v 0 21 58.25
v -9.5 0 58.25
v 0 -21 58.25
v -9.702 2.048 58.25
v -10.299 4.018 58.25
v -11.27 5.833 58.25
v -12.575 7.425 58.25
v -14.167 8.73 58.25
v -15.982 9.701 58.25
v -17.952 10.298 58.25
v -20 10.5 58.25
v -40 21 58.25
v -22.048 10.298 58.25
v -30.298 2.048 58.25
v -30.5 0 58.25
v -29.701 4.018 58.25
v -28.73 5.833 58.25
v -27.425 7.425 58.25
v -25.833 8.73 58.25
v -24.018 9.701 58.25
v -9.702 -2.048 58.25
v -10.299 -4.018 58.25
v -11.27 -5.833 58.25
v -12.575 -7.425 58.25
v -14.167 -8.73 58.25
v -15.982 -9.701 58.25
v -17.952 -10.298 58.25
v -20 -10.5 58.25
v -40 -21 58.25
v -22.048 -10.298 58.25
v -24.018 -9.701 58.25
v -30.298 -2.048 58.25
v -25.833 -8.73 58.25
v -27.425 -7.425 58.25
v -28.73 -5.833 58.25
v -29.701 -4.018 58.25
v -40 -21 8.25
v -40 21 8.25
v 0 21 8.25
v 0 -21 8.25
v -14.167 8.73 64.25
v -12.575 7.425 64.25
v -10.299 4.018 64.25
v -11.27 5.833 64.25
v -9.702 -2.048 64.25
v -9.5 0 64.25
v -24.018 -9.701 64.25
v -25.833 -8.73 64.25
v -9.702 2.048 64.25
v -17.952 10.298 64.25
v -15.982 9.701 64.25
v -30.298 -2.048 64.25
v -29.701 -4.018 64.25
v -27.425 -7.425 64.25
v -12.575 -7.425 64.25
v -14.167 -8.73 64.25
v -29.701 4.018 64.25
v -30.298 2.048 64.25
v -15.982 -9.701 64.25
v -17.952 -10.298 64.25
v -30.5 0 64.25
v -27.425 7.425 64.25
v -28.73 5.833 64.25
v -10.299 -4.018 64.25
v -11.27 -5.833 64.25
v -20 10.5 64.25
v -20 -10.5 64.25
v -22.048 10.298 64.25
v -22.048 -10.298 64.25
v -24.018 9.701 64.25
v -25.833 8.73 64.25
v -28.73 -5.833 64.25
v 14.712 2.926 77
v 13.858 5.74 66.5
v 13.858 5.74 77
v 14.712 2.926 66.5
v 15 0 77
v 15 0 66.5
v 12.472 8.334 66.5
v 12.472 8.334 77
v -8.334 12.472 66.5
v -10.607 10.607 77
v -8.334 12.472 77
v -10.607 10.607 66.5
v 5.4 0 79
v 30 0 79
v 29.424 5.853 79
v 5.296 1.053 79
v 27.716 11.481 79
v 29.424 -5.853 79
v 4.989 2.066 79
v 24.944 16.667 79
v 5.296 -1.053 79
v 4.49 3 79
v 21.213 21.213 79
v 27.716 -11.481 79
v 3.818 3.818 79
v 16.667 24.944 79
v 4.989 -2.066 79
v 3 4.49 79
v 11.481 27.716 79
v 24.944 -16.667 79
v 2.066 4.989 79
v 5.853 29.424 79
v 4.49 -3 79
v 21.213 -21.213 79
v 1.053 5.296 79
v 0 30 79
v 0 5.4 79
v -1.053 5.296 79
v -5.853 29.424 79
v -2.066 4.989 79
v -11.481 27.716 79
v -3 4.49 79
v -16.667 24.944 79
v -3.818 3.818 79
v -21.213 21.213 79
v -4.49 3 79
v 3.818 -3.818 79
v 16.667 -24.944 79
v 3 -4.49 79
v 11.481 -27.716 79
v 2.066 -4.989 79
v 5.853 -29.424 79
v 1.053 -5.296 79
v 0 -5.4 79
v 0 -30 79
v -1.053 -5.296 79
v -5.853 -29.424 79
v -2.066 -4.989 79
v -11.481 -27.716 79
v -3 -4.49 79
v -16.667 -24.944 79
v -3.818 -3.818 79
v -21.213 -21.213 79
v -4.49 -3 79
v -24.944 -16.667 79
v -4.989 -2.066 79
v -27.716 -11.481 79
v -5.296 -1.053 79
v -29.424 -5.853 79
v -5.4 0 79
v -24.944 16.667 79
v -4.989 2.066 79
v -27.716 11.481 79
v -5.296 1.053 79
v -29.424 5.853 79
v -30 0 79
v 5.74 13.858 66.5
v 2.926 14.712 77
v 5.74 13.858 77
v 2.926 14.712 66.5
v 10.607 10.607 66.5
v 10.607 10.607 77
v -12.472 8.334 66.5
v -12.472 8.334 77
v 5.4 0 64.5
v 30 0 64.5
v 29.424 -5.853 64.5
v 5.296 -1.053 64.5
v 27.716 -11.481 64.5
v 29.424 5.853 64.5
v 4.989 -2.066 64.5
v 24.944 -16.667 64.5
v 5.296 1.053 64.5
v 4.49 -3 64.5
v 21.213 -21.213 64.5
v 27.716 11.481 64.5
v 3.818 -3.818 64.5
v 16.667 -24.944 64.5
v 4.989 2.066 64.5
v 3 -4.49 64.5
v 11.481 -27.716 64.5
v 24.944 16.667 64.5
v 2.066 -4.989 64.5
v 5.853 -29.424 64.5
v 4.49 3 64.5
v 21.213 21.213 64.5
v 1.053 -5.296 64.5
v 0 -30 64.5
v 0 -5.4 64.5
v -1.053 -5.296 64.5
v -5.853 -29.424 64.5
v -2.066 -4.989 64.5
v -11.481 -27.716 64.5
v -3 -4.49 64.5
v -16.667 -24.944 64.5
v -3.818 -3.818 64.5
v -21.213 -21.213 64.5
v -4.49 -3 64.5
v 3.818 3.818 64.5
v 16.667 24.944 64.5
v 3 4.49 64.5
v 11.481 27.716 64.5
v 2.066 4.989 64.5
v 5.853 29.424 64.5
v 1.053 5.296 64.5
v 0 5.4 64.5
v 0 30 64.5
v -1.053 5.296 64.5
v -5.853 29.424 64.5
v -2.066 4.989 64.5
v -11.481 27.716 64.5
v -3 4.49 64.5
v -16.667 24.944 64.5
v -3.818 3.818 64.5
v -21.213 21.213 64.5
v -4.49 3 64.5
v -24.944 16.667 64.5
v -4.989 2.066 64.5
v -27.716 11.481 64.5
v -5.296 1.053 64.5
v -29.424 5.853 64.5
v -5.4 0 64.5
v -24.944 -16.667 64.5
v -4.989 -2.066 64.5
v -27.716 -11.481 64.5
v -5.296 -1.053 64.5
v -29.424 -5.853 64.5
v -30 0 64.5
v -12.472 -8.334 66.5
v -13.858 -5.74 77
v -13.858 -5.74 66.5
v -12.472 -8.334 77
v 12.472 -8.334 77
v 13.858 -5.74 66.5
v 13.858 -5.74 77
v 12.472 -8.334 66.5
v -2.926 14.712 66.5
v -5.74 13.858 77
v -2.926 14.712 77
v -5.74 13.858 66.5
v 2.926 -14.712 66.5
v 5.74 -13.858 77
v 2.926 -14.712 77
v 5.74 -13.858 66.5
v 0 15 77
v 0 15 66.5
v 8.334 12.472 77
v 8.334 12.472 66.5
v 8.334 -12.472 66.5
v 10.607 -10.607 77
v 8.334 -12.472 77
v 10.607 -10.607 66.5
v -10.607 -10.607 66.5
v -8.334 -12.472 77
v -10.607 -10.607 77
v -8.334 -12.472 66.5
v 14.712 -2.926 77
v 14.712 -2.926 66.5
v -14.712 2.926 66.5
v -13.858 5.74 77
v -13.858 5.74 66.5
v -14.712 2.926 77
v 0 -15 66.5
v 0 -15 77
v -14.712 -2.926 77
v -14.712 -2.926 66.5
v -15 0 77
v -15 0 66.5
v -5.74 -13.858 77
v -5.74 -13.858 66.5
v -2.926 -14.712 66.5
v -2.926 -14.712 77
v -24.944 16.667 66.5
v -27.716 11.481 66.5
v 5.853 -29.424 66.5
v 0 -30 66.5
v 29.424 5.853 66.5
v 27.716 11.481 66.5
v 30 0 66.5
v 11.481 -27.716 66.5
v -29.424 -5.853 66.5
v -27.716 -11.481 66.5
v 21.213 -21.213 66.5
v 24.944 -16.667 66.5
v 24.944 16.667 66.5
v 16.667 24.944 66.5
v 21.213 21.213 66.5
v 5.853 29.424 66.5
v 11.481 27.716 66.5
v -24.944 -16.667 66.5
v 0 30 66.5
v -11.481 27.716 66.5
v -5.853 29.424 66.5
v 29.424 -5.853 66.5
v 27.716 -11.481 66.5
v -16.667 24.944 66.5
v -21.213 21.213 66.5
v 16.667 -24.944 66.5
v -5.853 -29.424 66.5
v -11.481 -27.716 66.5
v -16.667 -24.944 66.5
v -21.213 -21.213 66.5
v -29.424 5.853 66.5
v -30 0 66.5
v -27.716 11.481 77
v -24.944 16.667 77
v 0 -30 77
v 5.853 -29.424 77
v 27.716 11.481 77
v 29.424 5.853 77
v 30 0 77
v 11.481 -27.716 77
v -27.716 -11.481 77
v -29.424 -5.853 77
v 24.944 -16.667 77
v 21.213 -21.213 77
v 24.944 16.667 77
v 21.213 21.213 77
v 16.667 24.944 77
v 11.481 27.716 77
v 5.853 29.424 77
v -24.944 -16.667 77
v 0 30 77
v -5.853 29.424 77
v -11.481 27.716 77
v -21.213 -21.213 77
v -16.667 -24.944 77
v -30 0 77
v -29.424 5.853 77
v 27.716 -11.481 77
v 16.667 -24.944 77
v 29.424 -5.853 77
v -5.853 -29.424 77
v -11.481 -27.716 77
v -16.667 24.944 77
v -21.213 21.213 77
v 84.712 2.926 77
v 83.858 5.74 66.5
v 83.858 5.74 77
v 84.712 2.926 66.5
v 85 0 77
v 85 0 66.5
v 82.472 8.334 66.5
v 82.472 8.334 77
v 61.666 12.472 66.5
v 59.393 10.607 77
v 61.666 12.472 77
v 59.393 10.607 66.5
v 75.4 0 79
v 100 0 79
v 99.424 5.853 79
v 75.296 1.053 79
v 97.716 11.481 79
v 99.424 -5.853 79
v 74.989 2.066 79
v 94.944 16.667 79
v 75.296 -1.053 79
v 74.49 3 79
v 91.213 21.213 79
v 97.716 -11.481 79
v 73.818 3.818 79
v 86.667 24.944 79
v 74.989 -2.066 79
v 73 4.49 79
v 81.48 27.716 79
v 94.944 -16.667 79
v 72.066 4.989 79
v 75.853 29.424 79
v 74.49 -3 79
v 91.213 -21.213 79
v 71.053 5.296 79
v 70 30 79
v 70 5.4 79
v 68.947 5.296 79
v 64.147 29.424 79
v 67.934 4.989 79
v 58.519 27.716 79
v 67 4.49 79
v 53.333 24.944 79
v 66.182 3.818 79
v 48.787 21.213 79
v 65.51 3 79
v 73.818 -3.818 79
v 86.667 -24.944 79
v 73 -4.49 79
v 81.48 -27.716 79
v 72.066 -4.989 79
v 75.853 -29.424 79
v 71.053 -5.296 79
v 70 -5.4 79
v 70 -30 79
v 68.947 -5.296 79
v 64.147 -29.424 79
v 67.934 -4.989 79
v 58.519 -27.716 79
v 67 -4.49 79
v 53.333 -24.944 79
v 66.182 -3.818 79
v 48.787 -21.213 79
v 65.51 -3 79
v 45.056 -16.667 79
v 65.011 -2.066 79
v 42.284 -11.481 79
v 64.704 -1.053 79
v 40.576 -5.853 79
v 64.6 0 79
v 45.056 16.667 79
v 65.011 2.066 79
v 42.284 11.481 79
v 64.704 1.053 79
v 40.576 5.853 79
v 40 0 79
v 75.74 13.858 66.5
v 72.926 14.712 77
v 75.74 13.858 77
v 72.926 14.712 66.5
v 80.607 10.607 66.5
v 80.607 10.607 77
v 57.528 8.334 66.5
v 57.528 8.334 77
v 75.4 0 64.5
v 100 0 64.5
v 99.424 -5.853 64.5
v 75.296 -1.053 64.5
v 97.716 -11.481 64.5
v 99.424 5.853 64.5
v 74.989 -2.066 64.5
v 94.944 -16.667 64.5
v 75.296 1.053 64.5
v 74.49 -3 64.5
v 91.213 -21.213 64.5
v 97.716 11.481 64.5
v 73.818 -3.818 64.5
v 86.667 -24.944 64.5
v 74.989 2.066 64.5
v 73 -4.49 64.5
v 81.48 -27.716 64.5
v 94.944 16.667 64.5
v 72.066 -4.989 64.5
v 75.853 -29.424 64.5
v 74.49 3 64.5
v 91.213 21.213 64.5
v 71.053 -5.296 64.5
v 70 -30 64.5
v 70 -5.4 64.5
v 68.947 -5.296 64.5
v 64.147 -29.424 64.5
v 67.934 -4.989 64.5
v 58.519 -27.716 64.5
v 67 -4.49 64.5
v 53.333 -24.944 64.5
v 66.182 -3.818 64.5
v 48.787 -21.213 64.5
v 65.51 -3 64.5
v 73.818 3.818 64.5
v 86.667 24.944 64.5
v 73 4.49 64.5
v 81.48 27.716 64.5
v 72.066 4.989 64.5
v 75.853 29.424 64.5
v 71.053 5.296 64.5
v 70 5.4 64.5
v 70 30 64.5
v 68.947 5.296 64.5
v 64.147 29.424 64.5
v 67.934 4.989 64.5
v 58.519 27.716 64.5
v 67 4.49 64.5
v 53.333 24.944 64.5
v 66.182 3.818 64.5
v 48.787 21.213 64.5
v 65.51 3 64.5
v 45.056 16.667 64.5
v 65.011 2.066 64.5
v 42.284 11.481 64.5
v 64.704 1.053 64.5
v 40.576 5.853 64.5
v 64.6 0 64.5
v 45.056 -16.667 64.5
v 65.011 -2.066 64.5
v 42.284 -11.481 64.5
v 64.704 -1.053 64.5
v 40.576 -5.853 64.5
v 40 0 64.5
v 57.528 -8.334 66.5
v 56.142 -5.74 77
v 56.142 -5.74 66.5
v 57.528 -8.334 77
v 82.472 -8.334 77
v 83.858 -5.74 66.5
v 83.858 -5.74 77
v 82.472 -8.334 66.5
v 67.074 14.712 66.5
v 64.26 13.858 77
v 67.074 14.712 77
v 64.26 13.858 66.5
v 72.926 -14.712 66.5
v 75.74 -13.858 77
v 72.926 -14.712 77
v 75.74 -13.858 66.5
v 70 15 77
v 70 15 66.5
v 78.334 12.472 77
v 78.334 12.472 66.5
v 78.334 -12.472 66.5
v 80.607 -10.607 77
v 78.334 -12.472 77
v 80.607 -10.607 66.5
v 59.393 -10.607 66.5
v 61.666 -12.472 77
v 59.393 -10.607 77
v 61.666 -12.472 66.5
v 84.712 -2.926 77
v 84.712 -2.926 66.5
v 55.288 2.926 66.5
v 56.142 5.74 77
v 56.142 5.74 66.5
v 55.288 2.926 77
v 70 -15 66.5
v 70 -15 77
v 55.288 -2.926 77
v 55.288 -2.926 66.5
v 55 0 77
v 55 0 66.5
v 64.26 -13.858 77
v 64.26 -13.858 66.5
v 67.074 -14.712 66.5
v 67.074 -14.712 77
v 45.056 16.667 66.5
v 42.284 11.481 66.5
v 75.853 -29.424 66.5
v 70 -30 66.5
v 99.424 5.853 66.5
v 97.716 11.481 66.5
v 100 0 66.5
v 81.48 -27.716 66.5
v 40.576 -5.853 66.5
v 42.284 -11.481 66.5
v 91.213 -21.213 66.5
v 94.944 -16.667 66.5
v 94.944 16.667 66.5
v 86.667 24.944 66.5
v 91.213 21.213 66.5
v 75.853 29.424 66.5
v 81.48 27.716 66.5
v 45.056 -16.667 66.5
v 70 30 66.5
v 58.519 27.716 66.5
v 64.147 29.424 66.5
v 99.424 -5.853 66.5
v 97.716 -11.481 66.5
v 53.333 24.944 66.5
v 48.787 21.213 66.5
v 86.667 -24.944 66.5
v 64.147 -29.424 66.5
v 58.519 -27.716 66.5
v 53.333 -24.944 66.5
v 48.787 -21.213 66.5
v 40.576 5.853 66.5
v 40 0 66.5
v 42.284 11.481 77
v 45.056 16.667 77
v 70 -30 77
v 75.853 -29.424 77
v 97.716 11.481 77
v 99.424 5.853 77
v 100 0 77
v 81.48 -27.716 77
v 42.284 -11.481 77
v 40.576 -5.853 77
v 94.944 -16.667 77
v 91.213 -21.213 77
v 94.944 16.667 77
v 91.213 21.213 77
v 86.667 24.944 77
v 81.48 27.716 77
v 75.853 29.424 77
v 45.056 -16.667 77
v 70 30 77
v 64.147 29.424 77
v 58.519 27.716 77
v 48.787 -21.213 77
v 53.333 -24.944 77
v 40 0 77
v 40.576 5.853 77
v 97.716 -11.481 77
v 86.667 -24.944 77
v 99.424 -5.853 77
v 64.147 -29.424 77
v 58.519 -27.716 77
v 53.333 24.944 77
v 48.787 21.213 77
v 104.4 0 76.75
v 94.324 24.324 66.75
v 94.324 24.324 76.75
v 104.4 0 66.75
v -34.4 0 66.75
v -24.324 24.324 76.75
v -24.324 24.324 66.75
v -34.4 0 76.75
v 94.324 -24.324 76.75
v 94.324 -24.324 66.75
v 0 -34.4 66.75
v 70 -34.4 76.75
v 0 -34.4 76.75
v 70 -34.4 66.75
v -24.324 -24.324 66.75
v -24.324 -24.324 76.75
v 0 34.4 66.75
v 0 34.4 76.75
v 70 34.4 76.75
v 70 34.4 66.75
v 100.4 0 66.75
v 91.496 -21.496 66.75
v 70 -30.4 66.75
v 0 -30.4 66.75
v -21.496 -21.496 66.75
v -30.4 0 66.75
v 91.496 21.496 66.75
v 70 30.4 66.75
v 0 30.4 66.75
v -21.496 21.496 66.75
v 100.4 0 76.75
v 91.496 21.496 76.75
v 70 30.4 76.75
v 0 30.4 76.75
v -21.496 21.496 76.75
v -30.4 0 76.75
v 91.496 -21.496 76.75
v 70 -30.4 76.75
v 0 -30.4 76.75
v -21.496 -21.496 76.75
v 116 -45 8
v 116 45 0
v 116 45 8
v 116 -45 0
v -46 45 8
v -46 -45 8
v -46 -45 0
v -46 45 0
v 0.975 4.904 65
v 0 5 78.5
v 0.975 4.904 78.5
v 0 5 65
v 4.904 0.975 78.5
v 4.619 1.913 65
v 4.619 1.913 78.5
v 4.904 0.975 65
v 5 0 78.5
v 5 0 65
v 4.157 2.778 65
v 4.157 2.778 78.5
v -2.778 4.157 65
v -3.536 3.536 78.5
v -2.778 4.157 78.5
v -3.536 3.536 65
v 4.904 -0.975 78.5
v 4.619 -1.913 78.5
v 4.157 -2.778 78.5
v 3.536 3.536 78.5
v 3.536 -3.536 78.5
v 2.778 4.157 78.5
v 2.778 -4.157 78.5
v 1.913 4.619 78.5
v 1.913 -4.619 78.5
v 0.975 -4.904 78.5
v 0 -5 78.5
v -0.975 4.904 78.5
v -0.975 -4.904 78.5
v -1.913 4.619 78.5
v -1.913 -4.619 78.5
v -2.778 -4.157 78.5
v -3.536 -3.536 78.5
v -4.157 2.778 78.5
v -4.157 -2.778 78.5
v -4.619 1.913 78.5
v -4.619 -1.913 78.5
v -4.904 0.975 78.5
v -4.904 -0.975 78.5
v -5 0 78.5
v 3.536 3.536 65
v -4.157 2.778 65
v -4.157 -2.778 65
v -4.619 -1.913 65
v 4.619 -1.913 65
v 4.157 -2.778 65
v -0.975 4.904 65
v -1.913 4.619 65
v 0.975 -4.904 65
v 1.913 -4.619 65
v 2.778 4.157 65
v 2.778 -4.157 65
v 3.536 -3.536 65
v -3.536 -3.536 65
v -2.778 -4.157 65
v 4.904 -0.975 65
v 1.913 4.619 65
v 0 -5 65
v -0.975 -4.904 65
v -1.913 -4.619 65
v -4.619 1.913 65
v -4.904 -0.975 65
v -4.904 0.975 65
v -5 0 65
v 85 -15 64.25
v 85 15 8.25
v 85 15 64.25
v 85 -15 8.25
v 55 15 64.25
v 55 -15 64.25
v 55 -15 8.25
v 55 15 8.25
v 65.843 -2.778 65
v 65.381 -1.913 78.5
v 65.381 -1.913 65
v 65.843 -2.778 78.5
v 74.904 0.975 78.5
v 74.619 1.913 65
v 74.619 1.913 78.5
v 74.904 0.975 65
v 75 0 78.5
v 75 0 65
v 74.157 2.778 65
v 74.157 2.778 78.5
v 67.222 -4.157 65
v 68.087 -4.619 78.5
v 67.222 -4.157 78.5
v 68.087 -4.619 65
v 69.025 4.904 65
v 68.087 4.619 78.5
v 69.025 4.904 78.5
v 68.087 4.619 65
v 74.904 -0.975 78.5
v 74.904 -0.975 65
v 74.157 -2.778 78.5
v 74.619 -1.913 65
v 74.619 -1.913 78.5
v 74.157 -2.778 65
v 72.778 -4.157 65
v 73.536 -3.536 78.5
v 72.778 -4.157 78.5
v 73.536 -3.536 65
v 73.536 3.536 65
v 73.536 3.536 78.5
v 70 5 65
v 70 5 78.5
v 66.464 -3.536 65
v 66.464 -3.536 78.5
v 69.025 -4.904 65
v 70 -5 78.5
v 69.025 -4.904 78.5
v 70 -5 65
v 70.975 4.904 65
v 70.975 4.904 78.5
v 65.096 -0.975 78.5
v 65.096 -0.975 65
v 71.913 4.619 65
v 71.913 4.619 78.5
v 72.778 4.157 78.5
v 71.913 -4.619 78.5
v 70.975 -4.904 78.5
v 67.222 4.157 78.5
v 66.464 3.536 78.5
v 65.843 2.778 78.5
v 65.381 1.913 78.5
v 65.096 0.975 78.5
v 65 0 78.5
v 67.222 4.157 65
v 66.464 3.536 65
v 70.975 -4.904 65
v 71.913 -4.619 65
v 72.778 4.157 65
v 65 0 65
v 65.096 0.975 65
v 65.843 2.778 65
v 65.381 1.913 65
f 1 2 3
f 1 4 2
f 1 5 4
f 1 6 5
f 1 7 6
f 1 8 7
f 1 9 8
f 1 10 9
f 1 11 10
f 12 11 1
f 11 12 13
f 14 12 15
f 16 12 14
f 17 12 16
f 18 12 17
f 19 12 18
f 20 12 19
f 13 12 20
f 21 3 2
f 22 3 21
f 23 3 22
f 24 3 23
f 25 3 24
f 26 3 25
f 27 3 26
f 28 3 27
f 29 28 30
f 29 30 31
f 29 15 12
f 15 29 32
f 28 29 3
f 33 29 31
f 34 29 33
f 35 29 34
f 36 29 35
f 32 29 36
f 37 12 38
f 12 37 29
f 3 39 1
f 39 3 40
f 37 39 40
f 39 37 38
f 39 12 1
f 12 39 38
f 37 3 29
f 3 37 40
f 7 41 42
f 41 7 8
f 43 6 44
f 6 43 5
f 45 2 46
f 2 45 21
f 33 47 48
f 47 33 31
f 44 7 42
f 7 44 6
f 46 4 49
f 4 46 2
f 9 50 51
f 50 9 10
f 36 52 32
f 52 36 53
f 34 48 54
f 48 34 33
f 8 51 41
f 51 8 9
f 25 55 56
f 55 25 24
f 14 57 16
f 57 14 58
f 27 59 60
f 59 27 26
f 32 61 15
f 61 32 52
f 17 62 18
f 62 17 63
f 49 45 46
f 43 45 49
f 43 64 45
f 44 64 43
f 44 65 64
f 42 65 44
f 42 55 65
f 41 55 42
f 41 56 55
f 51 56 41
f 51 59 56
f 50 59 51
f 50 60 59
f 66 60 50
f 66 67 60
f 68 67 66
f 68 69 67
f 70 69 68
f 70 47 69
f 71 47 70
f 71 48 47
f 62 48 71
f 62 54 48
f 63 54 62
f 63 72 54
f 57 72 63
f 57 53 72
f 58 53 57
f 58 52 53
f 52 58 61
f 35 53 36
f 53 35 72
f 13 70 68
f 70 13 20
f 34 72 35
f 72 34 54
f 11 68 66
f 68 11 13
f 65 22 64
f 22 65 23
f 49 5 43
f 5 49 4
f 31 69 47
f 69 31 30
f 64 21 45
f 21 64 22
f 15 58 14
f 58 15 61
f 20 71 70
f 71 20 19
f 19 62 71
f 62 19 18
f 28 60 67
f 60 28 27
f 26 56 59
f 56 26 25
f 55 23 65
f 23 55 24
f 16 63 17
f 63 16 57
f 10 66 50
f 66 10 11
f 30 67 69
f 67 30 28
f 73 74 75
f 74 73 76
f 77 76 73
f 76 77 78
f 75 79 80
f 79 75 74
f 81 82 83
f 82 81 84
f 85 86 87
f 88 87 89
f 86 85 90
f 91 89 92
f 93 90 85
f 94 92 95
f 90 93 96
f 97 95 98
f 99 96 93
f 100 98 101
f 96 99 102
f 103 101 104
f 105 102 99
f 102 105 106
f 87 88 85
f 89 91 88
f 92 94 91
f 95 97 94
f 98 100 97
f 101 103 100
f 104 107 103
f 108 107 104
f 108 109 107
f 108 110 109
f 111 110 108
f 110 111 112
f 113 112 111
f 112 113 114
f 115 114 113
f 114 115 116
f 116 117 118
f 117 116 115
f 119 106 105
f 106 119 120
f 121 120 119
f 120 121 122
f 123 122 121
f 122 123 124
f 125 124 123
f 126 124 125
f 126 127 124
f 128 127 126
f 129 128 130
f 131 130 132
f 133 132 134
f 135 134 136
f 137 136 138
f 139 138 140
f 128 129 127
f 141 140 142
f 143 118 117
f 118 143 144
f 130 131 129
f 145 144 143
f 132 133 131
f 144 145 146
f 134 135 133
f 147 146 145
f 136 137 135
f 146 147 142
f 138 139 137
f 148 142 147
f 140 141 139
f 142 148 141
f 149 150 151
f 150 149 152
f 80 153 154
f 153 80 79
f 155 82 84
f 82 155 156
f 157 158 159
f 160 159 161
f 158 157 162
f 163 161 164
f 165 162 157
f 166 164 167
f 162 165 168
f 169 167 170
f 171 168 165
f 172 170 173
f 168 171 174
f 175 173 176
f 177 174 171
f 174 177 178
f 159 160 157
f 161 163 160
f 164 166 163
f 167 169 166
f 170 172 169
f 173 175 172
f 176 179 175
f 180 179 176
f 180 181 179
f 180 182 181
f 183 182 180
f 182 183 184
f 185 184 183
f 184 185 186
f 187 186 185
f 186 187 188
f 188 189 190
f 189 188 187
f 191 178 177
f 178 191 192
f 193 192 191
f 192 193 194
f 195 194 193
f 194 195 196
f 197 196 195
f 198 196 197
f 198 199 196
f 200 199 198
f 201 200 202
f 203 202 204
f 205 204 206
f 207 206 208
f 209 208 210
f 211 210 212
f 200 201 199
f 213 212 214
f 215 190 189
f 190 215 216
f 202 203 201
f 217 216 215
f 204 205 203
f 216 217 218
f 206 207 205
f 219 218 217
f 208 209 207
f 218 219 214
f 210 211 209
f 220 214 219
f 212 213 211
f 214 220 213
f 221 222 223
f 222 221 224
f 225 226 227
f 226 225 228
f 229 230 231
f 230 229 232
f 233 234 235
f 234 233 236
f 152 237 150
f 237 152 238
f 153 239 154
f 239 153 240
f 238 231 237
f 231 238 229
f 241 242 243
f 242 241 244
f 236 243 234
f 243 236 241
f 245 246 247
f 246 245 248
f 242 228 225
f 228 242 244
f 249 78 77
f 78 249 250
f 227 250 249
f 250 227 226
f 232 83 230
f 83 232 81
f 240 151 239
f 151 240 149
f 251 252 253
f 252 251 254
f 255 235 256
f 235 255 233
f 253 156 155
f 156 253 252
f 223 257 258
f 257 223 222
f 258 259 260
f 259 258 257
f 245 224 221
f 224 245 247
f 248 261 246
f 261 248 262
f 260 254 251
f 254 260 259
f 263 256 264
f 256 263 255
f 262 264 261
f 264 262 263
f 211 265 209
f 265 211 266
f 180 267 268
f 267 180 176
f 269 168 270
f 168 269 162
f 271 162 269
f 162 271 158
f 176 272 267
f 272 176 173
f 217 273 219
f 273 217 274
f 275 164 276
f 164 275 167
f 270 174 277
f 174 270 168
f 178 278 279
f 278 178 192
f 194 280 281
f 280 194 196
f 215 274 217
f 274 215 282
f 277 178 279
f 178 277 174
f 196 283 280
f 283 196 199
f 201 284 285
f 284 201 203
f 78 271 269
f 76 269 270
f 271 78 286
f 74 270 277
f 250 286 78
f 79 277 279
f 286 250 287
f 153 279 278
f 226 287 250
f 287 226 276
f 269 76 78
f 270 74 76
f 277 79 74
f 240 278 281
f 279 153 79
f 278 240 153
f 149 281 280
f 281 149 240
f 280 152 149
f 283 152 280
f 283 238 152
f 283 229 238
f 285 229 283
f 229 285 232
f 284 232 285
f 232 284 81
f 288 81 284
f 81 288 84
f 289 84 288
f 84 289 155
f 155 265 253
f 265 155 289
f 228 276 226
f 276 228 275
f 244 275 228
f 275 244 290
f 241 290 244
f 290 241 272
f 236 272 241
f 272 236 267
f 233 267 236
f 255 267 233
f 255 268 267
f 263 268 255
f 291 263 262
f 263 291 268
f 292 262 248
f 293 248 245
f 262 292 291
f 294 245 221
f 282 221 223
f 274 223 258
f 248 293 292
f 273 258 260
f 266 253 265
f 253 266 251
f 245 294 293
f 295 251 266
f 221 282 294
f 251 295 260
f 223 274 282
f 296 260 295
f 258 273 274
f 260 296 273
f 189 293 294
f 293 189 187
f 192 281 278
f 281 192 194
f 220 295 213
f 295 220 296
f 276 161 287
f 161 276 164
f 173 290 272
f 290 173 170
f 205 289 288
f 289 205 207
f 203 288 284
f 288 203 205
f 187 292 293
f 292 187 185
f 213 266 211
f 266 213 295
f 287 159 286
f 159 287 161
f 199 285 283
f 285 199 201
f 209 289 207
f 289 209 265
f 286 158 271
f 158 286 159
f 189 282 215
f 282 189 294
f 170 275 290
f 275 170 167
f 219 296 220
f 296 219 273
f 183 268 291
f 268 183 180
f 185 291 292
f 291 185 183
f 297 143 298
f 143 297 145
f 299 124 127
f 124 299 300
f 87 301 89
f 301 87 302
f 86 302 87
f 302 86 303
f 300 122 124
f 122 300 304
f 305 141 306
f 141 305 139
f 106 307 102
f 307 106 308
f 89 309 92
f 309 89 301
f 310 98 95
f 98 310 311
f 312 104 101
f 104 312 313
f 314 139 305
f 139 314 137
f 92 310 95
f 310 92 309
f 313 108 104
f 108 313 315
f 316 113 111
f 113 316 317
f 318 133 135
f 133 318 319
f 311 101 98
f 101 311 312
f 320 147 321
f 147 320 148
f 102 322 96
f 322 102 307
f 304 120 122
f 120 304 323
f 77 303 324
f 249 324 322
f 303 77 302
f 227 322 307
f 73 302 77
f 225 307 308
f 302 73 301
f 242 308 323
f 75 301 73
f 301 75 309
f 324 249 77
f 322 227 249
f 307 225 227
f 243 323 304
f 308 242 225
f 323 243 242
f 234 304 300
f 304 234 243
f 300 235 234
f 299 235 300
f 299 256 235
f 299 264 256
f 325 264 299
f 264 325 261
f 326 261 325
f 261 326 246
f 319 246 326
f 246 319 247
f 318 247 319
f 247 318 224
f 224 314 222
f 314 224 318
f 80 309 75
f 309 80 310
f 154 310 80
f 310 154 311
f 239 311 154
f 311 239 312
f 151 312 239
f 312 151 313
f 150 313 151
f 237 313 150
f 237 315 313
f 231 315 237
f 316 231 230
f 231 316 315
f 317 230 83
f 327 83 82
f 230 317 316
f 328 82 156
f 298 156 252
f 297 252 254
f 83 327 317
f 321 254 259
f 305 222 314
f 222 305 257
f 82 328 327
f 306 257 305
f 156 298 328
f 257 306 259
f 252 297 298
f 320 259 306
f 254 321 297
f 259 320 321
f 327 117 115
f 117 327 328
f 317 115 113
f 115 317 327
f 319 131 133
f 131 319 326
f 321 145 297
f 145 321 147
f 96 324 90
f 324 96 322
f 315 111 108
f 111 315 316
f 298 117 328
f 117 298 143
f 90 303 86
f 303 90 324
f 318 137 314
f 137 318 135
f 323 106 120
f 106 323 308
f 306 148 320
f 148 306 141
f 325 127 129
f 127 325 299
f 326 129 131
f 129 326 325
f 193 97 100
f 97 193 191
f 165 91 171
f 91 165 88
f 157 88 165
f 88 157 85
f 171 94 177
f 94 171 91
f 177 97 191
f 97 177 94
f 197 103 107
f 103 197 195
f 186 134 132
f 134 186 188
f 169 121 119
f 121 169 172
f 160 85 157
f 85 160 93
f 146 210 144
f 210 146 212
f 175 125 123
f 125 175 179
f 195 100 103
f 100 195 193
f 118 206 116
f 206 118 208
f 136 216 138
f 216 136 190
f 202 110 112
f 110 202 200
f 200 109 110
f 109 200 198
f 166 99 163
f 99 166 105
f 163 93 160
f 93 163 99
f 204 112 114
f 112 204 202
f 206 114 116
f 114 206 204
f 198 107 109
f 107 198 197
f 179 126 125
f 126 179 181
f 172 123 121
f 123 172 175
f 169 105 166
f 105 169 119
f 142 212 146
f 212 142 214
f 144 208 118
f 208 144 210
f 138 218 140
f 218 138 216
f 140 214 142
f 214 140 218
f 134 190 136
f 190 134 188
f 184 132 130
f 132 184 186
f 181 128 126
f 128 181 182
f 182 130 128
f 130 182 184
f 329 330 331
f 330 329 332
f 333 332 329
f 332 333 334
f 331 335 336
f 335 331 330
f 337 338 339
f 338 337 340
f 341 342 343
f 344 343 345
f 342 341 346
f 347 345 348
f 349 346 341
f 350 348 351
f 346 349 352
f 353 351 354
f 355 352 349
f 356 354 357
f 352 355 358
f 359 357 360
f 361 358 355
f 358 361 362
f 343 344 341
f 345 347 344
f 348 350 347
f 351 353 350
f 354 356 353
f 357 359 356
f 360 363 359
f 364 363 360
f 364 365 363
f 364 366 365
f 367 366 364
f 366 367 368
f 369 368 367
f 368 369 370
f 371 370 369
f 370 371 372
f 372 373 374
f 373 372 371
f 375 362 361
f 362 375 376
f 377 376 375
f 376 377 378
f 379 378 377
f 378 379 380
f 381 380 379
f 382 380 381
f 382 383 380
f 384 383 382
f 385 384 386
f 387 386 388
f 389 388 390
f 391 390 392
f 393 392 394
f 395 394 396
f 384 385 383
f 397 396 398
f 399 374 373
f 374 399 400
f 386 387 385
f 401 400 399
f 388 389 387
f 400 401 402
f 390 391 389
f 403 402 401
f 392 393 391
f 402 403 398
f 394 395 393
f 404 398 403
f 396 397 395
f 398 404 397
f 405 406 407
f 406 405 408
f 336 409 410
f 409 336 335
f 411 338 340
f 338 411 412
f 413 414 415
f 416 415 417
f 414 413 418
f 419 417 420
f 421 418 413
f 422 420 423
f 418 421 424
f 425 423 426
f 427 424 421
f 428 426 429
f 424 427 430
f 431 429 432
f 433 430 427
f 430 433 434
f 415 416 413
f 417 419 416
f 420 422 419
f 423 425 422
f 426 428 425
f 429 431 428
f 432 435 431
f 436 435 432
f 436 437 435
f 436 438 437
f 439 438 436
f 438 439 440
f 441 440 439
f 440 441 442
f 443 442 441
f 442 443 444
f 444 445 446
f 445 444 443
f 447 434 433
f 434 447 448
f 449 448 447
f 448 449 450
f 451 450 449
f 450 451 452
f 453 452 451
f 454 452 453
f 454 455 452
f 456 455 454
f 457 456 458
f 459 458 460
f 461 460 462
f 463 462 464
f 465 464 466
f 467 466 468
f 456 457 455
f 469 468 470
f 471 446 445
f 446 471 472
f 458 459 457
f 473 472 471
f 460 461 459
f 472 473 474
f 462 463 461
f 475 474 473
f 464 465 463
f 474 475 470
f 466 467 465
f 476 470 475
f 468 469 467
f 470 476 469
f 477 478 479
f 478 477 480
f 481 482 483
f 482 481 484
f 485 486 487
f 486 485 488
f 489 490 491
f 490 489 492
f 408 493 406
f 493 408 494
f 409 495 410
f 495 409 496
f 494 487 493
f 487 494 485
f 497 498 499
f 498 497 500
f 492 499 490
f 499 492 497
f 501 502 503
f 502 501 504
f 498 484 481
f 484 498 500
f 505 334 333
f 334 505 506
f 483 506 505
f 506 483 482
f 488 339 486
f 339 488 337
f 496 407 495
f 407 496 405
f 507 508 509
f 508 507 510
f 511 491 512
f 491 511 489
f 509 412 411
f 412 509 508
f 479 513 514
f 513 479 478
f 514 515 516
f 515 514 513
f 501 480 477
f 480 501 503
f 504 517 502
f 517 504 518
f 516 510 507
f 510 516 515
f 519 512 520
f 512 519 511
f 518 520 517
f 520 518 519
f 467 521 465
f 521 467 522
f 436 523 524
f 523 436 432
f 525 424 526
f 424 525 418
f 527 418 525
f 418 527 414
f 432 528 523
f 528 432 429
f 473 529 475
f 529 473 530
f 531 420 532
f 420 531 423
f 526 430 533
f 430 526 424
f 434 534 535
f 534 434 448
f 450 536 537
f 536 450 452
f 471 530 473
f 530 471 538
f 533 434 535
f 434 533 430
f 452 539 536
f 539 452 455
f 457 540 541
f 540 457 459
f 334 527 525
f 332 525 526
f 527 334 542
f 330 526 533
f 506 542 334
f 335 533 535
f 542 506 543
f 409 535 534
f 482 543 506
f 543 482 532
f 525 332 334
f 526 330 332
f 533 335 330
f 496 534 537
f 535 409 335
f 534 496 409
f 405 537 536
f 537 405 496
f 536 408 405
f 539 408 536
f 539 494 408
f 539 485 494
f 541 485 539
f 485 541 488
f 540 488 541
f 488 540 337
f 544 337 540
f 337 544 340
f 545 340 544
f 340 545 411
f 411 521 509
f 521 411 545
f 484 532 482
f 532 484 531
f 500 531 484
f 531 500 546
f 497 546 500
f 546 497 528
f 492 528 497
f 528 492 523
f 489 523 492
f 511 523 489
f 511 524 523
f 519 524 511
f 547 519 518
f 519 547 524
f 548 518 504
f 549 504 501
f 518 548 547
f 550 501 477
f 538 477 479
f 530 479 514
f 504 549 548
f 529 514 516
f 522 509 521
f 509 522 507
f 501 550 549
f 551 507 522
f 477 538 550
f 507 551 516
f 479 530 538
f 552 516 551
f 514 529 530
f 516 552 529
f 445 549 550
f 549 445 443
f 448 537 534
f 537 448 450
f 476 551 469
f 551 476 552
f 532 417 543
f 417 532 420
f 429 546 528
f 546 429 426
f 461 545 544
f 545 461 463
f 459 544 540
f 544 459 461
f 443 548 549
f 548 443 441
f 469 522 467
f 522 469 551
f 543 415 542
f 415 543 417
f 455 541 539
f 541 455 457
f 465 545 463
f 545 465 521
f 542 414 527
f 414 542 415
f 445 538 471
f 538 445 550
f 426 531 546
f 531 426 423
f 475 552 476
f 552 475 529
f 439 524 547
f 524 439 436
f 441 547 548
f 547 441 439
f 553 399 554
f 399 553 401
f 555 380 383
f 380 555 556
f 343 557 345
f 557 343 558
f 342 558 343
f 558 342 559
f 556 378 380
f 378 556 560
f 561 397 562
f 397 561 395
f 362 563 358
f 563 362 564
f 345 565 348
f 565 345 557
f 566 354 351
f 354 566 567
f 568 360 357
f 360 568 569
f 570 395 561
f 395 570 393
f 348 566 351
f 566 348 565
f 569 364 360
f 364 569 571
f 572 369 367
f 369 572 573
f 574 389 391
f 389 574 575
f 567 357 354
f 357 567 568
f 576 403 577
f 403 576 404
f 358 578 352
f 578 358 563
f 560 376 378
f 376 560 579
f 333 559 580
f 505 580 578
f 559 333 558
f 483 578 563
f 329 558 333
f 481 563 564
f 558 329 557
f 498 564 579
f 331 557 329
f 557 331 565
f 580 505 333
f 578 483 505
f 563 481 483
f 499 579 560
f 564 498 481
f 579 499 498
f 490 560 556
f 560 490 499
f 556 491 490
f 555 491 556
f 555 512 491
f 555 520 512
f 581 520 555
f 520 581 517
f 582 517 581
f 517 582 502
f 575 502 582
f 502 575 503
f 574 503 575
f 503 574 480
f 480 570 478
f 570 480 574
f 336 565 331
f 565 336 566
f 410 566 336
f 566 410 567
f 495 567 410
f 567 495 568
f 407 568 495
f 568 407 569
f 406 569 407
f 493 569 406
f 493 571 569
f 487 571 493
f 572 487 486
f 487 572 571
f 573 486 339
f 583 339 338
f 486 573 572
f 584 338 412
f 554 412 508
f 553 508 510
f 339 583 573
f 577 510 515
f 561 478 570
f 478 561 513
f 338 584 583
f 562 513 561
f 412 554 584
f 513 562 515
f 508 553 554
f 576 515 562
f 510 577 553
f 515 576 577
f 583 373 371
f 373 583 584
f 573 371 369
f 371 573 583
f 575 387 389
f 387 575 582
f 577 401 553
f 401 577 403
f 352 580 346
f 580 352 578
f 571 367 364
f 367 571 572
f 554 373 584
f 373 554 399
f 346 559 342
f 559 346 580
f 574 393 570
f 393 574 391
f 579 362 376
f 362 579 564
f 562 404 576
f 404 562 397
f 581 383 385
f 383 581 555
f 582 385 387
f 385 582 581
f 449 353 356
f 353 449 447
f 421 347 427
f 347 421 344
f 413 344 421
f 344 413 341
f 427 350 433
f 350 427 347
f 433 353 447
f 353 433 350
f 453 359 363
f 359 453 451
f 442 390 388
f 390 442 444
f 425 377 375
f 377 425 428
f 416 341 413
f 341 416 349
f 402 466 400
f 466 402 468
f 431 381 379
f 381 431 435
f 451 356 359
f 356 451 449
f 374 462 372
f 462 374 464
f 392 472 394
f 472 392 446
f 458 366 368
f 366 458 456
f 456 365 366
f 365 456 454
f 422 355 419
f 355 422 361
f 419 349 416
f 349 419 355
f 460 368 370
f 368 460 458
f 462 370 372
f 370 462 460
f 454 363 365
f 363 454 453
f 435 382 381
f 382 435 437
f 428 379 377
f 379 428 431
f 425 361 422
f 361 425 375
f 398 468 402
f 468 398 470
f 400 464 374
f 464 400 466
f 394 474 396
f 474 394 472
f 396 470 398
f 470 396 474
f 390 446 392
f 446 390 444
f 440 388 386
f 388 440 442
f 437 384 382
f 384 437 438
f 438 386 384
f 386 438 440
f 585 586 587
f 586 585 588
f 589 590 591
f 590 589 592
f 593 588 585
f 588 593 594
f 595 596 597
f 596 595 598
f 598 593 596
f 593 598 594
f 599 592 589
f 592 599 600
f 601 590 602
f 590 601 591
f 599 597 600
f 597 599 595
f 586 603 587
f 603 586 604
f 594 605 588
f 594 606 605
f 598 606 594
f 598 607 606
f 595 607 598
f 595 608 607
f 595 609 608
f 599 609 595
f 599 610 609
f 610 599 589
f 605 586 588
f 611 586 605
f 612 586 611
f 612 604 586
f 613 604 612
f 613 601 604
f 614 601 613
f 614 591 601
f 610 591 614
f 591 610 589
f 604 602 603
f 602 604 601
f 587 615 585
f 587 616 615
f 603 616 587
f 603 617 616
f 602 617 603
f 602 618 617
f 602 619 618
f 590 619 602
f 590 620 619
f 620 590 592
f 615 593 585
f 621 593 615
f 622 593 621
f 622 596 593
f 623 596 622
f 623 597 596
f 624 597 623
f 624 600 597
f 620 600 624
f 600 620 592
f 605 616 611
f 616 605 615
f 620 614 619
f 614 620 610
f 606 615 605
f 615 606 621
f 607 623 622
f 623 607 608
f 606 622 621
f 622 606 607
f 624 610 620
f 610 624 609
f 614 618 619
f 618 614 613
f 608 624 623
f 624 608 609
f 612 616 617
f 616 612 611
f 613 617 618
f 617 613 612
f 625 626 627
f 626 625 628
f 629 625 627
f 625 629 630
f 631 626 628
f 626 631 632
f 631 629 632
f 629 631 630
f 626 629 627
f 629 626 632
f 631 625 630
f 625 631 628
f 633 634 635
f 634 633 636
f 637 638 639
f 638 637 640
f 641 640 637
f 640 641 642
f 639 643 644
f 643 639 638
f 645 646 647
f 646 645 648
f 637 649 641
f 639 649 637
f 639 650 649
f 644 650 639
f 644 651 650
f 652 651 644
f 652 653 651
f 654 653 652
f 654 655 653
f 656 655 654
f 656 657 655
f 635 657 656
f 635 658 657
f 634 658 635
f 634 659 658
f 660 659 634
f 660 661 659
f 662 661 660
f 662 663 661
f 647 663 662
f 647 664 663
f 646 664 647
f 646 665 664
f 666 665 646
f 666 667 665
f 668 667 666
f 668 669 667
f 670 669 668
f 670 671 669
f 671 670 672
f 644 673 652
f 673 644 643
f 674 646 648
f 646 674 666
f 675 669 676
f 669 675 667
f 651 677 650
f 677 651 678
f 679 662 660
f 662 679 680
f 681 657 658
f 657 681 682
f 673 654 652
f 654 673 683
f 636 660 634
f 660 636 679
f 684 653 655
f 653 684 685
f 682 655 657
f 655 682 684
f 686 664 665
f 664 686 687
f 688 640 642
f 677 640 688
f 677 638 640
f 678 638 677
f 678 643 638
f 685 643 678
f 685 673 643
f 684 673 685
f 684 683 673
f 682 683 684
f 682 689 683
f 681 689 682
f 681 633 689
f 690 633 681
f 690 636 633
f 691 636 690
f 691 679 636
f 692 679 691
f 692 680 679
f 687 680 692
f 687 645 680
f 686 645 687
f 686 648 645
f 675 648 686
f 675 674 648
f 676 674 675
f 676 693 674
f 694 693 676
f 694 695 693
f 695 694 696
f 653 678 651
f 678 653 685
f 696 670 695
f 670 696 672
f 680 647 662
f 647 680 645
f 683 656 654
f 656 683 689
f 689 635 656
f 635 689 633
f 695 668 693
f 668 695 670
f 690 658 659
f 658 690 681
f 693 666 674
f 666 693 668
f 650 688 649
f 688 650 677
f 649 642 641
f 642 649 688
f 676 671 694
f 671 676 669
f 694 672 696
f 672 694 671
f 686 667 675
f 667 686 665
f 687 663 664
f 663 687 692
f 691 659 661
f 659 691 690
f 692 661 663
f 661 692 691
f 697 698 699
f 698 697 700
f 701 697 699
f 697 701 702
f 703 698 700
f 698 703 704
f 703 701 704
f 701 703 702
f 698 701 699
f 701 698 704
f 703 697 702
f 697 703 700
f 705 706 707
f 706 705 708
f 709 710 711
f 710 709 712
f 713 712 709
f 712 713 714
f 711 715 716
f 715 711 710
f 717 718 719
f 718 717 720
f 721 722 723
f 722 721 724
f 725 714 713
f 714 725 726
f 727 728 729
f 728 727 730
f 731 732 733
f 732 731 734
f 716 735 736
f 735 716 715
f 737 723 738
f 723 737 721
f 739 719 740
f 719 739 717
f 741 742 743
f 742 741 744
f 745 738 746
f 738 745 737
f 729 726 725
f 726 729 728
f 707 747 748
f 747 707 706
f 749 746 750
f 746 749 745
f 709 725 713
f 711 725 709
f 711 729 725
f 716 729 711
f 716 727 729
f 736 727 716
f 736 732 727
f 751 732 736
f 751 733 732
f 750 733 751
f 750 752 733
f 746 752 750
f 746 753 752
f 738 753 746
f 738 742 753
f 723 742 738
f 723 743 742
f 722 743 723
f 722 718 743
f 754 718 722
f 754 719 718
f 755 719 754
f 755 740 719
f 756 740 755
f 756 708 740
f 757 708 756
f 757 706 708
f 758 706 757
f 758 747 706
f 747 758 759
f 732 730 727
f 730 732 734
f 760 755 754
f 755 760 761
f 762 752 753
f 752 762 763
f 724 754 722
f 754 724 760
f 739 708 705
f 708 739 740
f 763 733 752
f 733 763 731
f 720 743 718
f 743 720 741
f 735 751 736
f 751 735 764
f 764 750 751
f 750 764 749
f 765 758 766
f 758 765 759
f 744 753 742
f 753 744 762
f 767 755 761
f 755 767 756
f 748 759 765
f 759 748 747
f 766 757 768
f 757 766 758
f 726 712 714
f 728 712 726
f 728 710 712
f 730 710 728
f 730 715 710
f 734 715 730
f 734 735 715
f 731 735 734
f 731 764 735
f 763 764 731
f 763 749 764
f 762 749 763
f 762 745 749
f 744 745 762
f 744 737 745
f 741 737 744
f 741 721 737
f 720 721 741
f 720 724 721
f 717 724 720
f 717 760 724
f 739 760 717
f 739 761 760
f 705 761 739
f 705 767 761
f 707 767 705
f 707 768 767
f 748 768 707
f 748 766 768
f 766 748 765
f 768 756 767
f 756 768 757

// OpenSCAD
$fn = 32;

// ------------------------------------------------------------------------
// Motor belt drive: span 70 mm, pulleys d60, belt 10 mm wide
// Every part is its own module, assembly() places every instance.
// ------------------------------------------------------------------------

// --- part 1 ---
module base_plate() {
  difference() {
    translate([-81, -45, 0]) cube([162, 90, 8]);
  }
}

// --- part 2 ---
module motor() {
  union() {
    translate([-25, -21, 0]) cube([50, 42, 40]);
    translate([28, 0, 20]) rotate([0, 90, 0]) cylinder(h = 6, d = 21, center = true);
  }
}

// --- part 3 ---
module drive_shaft() {
  translate([0, 0, -6.75]) cylinder(h = 13.5, d = 10);
}

// --- part 4 ---
module pulley_drive() {
  difference() {
    union() {
      cylinder(h = 14.5, d = 30);
      cylinder(h = 2, d = 60);
      translate([0, 0, 12.5]) cylinder(h = 2, d = 60);
    }
    translate([0, 0, -1]) cylinder(h = 16.5, d = 10.8);
  }
}

// --- part 5 ---
module idler_post() {
  translate([-15, -15, 0]) cube([30, 30, 56]);
}

// --- part 6 ---
module driven_shaft() {
  translate([0, 0, -6.75]) cylinder(h = 13.5, d = 10);
}

// --- part 7 ---
module pulley_driven() {
  difference() {
    union() {
      cylinder(h = 14.5, d = 30);
      cylinder(h = 2, d = 60);
      translate([0, 0, 12.5]) cylinder(h = 2, d = 60);
    }
    translate([0, 0, -1]) cylinder(h = 16.5, d = 10.8);
  }
}

// --- part 8 ---
module drive_belt() {
  difference() {
    linear_extrude(height = 10) polygon(points = concat([for (a = [90 : 45 : 270]) [34.4 * cos(a), 34.4 * sin(a)]], [for (a = [270 : 45 : 450]) [70 + 34.4 * cos(a), 34.4 * sin(a)]]));
    translate([0, 0, -1]) linear_extrude(height = 12) polygon(points = concat([for (a = [90 : 45 : 270]) [30.4 * cos(a), 30.4 * sin(a)]], [for (a = [270 : 45 : 450]) [70 + 30.4 * cos(a), 30.4 * sin(a)]]));
  }
}

// --- assembly ---
module assembly() {
  color([0.80, 0.24, 0.20]) translate([35, 0, 0]) rotate([0, 0, 0]) base_plate();
  color([0.20, 0.45, 0.75]) translate([0, 0, 33.25]) rotate([0, 270, 0]) motor();
  color([0.25, 0.62, 0.32]) translate([0, 0, 71.75]) rotate([0, 0, 0]) drive_shaft();
  color([0.92, 0.70, 0.18]) translate([0, 0, 64.5]) rotate([0, 0, 0]) pulley_drive();
  color([0.58, 0.35, 0.70]) translate([70, 0, 8.25]) rotate([0, 0, 0]) idler_post();
  color([0.16, 0.66, 0.66]) translate([70, 0, 71.75]) rotate([0, 0, 0]) driven_shaft();
  color([0.85, 0.48, 0.18]) translate([70, 0, 64.5]) rotate([0, 0, 0]) pulley_driven();
  color([0.55, 0.60, 0.65]) translate([0, 0, 66.75]) rotate([0, 0, 0]) drive_belt();
}

assembly();
